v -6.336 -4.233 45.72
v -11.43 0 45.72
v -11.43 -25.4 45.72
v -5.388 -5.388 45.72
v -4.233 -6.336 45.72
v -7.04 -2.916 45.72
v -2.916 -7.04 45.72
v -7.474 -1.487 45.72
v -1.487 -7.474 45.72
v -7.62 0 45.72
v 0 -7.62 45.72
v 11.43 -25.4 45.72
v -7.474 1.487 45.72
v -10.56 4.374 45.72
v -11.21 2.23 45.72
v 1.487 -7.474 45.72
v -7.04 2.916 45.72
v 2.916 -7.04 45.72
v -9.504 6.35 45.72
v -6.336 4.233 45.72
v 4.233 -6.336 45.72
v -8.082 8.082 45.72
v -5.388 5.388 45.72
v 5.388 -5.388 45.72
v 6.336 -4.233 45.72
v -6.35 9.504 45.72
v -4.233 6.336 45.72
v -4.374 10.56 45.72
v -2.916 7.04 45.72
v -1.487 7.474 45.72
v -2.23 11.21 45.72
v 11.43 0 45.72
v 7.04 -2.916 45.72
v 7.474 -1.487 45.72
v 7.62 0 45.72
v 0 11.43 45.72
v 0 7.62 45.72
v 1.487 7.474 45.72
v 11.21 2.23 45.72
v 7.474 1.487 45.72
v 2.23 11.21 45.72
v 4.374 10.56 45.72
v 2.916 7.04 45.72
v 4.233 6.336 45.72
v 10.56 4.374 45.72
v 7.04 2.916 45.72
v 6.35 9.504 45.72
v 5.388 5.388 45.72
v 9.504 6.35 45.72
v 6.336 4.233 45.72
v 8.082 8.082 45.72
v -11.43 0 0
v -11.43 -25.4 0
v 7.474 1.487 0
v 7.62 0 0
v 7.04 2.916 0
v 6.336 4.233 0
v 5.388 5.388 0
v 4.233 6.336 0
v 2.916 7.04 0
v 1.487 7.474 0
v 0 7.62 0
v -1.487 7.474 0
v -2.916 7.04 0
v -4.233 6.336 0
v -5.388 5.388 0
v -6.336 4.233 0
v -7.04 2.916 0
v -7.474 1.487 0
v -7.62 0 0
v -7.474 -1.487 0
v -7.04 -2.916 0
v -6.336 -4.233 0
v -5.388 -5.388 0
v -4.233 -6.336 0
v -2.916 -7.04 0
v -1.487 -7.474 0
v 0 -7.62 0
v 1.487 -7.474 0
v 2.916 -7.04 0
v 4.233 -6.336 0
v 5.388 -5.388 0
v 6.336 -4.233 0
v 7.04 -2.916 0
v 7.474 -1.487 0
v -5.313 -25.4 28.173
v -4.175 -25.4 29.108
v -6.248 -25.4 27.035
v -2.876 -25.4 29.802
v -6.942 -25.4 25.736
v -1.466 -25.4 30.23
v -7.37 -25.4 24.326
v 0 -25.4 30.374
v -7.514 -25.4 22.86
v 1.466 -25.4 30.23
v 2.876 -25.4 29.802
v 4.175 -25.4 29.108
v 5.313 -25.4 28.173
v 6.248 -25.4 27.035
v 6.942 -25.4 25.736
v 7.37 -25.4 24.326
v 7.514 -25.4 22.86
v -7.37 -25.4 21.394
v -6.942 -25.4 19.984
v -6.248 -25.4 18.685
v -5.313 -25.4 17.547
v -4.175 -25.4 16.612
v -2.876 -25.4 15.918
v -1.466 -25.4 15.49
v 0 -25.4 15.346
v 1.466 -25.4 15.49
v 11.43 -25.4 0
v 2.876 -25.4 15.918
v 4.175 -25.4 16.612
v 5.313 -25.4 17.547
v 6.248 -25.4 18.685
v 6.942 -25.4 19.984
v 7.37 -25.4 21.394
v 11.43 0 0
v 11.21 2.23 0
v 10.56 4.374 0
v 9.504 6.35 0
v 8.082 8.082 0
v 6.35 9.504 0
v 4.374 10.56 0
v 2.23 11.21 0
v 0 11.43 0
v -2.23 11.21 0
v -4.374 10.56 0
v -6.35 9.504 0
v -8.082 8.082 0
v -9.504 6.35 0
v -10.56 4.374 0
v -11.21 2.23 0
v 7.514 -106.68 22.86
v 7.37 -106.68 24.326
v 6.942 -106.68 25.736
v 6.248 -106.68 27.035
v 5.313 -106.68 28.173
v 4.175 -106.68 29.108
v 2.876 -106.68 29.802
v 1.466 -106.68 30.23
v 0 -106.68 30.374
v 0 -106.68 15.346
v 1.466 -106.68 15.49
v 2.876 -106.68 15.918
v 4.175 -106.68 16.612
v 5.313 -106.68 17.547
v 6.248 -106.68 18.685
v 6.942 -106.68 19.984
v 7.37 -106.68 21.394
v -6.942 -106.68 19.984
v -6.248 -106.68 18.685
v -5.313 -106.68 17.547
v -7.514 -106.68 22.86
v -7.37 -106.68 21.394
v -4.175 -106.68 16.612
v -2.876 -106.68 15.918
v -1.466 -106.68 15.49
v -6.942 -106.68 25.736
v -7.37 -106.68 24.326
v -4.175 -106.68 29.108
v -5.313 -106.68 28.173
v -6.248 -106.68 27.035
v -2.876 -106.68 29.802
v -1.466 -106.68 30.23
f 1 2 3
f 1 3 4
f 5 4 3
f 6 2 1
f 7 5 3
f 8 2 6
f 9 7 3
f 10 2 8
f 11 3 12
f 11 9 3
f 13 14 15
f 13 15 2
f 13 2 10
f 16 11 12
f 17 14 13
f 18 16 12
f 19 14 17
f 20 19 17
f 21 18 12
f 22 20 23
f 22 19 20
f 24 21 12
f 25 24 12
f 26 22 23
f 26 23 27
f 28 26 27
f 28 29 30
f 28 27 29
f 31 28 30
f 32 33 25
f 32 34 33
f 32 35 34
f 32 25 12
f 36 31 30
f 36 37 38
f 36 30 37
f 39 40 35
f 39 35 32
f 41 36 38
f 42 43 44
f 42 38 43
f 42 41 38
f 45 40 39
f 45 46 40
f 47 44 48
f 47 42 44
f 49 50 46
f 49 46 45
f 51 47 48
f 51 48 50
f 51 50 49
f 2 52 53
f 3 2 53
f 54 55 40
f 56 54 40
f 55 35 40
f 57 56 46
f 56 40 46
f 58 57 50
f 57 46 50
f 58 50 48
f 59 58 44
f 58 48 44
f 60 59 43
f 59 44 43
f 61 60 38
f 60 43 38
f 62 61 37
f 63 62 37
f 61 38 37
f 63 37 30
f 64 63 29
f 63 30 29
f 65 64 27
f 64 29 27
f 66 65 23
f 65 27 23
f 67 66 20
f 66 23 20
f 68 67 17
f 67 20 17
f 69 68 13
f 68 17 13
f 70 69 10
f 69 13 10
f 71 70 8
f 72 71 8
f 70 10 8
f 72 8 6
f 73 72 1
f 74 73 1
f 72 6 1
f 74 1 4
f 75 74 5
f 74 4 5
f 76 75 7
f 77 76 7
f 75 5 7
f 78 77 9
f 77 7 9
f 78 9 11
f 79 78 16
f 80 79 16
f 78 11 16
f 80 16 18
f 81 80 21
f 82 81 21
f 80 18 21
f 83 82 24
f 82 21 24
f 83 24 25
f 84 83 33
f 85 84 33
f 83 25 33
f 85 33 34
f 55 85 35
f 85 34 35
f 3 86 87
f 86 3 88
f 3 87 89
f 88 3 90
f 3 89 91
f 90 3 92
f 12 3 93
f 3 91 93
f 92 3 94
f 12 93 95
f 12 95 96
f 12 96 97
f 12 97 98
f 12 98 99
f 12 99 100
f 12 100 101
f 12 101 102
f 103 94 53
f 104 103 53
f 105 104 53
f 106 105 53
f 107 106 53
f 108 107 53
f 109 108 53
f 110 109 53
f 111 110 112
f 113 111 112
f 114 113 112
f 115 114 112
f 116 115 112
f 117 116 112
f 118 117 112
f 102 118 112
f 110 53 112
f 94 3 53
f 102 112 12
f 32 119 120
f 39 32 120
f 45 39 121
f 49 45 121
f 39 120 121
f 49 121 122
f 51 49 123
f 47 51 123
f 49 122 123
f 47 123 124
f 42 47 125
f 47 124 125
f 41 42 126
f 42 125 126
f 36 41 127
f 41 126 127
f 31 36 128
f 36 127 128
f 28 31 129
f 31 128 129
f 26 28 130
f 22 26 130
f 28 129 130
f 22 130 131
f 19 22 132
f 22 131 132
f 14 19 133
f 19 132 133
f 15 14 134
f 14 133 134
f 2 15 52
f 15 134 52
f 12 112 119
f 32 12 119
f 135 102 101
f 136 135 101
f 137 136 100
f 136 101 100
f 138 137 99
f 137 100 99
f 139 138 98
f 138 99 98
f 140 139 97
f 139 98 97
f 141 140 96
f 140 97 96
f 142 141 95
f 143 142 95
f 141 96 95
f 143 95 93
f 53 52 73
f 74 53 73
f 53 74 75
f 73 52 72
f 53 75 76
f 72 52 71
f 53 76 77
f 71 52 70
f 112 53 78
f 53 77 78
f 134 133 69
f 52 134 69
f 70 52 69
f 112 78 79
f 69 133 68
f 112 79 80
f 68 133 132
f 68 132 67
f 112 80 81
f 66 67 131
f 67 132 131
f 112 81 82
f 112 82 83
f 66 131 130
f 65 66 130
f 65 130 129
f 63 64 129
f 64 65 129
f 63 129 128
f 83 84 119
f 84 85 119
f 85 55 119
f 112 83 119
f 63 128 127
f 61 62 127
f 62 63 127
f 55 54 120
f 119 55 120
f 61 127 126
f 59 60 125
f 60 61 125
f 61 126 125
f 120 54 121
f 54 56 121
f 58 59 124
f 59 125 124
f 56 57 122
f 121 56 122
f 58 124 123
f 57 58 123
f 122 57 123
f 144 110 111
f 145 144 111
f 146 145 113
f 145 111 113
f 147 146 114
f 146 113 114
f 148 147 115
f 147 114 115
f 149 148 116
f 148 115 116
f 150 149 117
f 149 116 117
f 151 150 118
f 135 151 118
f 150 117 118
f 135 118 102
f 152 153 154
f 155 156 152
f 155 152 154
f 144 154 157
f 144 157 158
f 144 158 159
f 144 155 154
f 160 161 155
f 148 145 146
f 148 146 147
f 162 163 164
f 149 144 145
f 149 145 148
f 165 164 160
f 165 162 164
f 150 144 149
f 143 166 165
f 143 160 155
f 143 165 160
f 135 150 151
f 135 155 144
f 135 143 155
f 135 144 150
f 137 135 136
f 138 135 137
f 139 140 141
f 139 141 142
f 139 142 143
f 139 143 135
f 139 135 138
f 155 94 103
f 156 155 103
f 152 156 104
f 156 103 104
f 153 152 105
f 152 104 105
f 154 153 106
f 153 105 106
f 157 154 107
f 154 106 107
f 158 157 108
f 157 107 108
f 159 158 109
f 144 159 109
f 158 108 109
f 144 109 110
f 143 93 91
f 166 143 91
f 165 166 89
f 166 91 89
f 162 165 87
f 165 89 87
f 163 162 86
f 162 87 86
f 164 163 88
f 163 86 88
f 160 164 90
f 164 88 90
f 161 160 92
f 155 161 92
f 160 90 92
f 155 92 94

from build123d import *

# Parameters (mm, degrees)
BOSS_EXTRUDE1_DEPTH = 45.72
SKETCH2_R           = 7.62
CUT_EXTRUDE1_DEPTH  = 10.414
SKETCH3_R           = 7.62
CUT_EXTRUDE2_DEPTH  = 76.2
BOSS_EXTRUDE2_DEPTH = 81.28


with BuildPart() as part:
    # Sketch1 → Boss-Extrude1 (new body)
    with BuildSketch(Plane.XY):
        with BuildLine():
            Line((-11.43, 0), (-11.43, -25.4))
            Line((-11.43, -25.4), (11.43, -25.4))
            Line((11.43, -25.4), (11.43, 0))
            ThreePointArc((11.43, 0), (0, 11.43), (-11.43, 0))
        make_face()
    extrude(amount=BOSS_EXTRUDE1_DEPTH)

    # Sketch2 → Cut-Extrude1 (cut)
    with BuildSketch(Plane.XY.offset(45.72)):
        Circle(SKETCH2_R)
    extrude(amount=-CUT_EXTRUDE1_DEPTH, mode=Mode.SUBTRACT)

    # Sketch3 → Cut-Extrude2 (cut)
    with BuildSketch(Plane.XY.offset(45.72)):
        Circle(SKETCH3_R)
    extrude(amount=-CUT_EXTRUDE2_DEPTH, mode=Mode.SUBTRACT)

    # Sketch4 → Boss-Extrude2 (add)
    with BuildSketch(Plane.XZ.offset(25.4)):
        with BuildLine():
            ThreePointArc((-7.514066823, 22.86), (-5.313247605, 17.546752395), (0, 15.345933177))
            Line((0, 15.345933177), (0, 22.86))
            Line((0, 22.86), (-7.514066823, 22.86))
        make_face()
        with BuildLine():
            Line((0, 22.86), (0, 15.345933177))
            ThreePointArc((0, 15.345933177), (5.313247605, 17.546752395), (7.514066823, 22.86))
            Line((7.514066823, 22.86), (0, 22.86))
        make_face()
        with BuildLine():
            Line((-7.514066823, 22.86), (0, 22.86))
            Line((0, 22.86), (0, 30.374066823))
            ThreePointArc((0, 30.374066823), (-5.313247605, 28.173247605), (-7.514066823, 22.86))
        make_face()
        with BuildLine():
            Line((0, 30.374066823), (0, 22.86))
            Line((0, 22.86), (7.514066823, 22.86))
            ThreePointArc((7.514066823, 22.86), (5.313247605, 28.173247605), (0, 30.374066823))
        make_face()
    extrude(amount=BOSS_EXTRUDE2_DEPTH)


solid = part.part
